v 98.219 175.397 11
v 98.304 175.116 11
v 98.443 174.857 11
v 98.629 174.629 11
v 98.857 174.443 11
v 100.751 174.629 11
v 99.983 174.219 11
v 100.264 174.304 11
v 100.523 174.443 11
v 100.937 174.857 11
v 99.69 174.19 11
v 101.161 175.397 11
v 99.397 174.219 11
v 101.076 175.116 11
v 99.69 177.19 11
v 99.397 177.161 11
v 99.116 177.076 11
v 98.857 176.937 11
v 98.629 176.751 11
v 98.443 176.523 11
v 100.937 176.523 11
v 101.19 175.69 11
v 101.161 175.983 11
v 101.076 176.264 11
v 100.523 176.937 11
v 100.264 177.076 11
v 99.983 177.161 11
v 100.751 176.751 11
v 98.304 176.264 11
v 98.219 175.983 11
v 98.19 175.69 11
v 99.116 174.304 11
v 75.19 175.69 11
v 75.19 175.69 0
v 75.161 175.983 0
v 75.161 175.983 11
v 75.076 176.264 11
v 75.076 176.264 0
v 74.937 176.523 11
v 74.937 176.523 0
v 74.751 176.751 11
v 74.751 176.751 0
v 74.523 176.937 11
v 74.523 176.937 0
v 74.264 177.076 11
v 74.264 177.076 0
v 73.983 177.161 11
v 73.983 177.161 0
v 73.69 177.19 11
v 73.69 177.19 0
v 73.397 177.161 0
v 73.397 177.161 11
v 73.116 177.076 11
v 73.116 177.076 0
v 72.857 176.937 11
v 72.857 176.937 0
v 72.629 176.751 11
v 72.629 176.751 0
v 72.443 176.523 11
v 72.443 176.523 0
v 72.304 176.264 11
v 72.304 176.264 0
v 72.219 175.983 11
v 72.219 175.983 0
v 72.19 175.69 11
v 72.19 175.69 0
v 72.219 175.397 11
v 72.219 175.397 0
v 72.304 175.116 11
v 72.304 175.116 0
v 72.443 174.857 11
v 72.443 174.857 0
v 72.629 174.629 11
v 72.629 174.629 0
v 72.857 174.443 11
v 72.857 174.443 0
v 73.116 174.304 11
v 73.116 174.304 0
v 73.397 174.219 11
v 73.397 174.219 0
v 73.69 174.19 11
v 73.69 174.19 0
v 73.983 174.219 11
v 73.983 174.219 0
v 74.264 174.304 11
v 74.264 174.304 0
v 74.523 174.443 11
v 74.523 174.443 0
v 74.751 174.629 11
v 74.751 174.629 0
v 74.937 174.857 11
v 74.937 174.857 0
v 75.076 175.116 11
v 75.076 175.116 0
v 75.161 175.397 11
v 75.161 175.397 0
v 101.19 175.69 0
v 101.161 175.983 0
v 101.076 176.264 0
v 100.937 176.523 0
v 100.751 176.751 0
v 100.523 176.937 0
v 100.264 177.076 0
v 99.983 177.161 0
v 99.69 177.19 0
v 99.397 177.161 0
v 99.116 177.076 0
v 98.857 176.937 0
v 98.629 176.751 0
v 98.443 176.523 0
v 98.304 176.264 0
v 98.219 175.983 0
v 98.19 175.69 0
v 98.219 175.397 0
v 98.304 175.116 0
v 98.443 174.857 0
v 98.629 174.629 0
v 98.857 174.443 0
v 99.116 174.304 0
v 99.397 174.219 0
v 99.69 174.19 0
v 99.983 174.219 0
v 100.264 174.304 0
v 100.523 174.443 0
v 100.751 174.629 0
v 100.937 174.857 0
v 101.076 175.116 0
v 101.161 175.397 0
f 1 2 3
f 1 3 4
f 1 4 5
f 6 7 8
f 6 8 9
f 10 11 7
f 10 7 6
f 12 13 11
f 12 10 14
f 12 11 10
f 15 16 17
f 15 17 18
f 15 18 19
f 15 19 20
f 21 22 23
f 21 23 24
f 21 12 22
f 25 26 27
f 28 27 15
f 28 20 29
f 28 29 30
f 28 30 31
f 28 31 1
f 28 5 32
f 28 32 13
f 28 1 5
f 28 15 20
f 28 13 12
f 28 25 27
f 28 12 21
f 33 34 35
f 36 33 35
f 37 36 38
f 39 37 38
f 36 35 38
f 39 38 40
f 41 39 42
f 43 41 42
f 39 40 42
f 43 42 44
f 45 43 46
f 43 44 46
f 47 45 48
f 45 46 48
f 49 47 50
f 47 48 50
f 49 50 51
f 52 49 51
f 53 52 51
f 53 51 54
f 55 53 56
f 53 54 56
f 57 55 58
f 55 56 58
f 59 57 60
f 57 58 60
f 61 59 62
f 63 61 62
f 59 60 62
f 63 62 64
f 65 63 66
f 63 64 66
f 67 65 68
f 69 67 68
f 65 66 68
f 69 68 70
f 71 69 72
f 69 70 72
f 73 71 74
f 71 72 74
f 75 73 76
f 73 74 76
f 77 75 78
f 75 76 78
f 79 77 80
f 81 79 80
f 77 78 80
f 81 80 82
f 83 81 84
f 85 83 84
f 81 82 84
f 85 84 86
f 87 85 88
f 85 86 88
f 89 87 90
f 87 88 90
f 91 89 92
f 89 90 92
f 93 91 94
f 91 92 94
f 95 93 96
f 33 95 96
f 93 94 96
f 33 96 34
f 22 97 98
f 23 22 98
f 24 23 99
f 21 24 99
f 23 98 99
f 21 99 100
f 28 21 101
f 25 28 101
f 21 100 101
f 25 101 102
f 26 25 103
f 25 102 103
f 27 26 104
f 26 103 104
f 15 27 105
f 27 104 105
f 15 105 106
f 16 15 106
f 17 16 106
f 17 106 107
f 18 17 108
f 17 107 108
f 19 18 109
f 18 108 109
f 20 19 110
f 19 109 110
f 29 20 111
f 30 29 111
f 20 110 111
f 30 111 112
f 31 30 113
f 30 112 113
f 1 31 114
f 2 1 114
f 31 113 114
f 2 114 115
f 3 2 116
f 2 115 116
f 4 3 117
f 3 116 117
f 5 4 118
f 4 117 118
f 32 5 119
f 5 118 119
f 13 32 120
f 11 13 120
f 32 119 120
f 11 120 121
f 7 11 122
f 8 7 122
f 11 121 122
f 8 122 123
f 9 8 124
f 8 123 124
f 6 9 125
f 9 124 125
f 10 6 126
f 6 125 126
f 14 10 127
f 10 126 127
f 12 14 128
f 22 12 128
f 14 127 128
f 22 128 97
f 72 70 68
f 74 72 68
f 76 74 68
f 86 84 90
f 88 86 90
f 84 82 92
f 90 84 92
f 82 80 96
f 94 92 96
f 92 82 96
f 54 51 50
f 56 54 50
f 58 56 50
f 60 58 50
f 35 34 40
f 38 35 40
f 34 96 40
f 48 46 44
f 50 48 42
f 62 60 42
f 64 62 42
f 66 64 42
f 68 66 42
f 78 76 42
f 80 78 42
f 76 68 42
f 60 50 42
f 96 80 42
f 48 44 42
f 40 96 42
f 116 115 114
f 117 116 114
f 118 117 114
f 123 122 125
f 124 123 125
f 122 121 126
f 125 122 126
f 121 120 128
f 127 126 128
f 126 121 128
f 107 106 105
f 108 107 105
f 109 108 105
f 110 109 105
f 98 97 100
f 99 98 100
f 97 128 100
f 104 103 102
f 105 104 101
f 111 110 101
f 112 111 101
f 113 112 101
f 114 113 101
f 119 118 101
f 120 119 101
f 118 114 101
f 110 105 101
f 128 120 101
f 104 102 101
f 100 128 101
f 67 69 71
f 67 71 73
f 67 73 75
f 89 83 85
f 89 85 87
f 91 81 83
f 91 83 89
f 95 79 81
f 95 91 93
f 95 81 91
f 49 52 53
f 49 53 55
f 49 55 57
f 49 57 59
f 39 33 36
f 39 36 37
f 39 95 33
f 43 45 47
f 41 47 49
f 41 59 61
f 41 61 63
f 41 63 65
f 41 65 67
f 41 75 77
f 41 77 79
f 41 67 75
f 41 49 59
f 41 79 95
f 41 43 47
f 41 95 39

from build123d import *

# Parameters (mm, degrees)
CYLINDER103_R     = 1.5
CYLINDER103_DEPTH = 11
CYLINDER107_R     = 1.5
CYLINDER107_DEPTH = 11


with BuildPart() as ftthreaded003:
    # Cylinder103 → Cylinder103 (new body)
    with BuildSketch(Plane(origin=(99.69, 175.69, 0), x_dir=(1, 0, 0), z_dir=(0, 0, 1))):
        Circle(CYLINDER103_R)
    extrude(amount=CYLINDER103_DEPTH)


with BuildPart() as rfftmounts1:
    # Cylinder107 → Cylinder107 (new body)
    with BuildSketch(Plane(origin=(73.69, 175.69, 0), x_dir=(1, 0, 0), z_dir=(0, 0, 1))):
        Circle(CYLINDER107_R)
    extrude(amount=CYLINDER107_DEPTH)

    # Fusion047: union FTThreaded003
    add(ftthreaded003.part)


solid = rfftmounts1.part
